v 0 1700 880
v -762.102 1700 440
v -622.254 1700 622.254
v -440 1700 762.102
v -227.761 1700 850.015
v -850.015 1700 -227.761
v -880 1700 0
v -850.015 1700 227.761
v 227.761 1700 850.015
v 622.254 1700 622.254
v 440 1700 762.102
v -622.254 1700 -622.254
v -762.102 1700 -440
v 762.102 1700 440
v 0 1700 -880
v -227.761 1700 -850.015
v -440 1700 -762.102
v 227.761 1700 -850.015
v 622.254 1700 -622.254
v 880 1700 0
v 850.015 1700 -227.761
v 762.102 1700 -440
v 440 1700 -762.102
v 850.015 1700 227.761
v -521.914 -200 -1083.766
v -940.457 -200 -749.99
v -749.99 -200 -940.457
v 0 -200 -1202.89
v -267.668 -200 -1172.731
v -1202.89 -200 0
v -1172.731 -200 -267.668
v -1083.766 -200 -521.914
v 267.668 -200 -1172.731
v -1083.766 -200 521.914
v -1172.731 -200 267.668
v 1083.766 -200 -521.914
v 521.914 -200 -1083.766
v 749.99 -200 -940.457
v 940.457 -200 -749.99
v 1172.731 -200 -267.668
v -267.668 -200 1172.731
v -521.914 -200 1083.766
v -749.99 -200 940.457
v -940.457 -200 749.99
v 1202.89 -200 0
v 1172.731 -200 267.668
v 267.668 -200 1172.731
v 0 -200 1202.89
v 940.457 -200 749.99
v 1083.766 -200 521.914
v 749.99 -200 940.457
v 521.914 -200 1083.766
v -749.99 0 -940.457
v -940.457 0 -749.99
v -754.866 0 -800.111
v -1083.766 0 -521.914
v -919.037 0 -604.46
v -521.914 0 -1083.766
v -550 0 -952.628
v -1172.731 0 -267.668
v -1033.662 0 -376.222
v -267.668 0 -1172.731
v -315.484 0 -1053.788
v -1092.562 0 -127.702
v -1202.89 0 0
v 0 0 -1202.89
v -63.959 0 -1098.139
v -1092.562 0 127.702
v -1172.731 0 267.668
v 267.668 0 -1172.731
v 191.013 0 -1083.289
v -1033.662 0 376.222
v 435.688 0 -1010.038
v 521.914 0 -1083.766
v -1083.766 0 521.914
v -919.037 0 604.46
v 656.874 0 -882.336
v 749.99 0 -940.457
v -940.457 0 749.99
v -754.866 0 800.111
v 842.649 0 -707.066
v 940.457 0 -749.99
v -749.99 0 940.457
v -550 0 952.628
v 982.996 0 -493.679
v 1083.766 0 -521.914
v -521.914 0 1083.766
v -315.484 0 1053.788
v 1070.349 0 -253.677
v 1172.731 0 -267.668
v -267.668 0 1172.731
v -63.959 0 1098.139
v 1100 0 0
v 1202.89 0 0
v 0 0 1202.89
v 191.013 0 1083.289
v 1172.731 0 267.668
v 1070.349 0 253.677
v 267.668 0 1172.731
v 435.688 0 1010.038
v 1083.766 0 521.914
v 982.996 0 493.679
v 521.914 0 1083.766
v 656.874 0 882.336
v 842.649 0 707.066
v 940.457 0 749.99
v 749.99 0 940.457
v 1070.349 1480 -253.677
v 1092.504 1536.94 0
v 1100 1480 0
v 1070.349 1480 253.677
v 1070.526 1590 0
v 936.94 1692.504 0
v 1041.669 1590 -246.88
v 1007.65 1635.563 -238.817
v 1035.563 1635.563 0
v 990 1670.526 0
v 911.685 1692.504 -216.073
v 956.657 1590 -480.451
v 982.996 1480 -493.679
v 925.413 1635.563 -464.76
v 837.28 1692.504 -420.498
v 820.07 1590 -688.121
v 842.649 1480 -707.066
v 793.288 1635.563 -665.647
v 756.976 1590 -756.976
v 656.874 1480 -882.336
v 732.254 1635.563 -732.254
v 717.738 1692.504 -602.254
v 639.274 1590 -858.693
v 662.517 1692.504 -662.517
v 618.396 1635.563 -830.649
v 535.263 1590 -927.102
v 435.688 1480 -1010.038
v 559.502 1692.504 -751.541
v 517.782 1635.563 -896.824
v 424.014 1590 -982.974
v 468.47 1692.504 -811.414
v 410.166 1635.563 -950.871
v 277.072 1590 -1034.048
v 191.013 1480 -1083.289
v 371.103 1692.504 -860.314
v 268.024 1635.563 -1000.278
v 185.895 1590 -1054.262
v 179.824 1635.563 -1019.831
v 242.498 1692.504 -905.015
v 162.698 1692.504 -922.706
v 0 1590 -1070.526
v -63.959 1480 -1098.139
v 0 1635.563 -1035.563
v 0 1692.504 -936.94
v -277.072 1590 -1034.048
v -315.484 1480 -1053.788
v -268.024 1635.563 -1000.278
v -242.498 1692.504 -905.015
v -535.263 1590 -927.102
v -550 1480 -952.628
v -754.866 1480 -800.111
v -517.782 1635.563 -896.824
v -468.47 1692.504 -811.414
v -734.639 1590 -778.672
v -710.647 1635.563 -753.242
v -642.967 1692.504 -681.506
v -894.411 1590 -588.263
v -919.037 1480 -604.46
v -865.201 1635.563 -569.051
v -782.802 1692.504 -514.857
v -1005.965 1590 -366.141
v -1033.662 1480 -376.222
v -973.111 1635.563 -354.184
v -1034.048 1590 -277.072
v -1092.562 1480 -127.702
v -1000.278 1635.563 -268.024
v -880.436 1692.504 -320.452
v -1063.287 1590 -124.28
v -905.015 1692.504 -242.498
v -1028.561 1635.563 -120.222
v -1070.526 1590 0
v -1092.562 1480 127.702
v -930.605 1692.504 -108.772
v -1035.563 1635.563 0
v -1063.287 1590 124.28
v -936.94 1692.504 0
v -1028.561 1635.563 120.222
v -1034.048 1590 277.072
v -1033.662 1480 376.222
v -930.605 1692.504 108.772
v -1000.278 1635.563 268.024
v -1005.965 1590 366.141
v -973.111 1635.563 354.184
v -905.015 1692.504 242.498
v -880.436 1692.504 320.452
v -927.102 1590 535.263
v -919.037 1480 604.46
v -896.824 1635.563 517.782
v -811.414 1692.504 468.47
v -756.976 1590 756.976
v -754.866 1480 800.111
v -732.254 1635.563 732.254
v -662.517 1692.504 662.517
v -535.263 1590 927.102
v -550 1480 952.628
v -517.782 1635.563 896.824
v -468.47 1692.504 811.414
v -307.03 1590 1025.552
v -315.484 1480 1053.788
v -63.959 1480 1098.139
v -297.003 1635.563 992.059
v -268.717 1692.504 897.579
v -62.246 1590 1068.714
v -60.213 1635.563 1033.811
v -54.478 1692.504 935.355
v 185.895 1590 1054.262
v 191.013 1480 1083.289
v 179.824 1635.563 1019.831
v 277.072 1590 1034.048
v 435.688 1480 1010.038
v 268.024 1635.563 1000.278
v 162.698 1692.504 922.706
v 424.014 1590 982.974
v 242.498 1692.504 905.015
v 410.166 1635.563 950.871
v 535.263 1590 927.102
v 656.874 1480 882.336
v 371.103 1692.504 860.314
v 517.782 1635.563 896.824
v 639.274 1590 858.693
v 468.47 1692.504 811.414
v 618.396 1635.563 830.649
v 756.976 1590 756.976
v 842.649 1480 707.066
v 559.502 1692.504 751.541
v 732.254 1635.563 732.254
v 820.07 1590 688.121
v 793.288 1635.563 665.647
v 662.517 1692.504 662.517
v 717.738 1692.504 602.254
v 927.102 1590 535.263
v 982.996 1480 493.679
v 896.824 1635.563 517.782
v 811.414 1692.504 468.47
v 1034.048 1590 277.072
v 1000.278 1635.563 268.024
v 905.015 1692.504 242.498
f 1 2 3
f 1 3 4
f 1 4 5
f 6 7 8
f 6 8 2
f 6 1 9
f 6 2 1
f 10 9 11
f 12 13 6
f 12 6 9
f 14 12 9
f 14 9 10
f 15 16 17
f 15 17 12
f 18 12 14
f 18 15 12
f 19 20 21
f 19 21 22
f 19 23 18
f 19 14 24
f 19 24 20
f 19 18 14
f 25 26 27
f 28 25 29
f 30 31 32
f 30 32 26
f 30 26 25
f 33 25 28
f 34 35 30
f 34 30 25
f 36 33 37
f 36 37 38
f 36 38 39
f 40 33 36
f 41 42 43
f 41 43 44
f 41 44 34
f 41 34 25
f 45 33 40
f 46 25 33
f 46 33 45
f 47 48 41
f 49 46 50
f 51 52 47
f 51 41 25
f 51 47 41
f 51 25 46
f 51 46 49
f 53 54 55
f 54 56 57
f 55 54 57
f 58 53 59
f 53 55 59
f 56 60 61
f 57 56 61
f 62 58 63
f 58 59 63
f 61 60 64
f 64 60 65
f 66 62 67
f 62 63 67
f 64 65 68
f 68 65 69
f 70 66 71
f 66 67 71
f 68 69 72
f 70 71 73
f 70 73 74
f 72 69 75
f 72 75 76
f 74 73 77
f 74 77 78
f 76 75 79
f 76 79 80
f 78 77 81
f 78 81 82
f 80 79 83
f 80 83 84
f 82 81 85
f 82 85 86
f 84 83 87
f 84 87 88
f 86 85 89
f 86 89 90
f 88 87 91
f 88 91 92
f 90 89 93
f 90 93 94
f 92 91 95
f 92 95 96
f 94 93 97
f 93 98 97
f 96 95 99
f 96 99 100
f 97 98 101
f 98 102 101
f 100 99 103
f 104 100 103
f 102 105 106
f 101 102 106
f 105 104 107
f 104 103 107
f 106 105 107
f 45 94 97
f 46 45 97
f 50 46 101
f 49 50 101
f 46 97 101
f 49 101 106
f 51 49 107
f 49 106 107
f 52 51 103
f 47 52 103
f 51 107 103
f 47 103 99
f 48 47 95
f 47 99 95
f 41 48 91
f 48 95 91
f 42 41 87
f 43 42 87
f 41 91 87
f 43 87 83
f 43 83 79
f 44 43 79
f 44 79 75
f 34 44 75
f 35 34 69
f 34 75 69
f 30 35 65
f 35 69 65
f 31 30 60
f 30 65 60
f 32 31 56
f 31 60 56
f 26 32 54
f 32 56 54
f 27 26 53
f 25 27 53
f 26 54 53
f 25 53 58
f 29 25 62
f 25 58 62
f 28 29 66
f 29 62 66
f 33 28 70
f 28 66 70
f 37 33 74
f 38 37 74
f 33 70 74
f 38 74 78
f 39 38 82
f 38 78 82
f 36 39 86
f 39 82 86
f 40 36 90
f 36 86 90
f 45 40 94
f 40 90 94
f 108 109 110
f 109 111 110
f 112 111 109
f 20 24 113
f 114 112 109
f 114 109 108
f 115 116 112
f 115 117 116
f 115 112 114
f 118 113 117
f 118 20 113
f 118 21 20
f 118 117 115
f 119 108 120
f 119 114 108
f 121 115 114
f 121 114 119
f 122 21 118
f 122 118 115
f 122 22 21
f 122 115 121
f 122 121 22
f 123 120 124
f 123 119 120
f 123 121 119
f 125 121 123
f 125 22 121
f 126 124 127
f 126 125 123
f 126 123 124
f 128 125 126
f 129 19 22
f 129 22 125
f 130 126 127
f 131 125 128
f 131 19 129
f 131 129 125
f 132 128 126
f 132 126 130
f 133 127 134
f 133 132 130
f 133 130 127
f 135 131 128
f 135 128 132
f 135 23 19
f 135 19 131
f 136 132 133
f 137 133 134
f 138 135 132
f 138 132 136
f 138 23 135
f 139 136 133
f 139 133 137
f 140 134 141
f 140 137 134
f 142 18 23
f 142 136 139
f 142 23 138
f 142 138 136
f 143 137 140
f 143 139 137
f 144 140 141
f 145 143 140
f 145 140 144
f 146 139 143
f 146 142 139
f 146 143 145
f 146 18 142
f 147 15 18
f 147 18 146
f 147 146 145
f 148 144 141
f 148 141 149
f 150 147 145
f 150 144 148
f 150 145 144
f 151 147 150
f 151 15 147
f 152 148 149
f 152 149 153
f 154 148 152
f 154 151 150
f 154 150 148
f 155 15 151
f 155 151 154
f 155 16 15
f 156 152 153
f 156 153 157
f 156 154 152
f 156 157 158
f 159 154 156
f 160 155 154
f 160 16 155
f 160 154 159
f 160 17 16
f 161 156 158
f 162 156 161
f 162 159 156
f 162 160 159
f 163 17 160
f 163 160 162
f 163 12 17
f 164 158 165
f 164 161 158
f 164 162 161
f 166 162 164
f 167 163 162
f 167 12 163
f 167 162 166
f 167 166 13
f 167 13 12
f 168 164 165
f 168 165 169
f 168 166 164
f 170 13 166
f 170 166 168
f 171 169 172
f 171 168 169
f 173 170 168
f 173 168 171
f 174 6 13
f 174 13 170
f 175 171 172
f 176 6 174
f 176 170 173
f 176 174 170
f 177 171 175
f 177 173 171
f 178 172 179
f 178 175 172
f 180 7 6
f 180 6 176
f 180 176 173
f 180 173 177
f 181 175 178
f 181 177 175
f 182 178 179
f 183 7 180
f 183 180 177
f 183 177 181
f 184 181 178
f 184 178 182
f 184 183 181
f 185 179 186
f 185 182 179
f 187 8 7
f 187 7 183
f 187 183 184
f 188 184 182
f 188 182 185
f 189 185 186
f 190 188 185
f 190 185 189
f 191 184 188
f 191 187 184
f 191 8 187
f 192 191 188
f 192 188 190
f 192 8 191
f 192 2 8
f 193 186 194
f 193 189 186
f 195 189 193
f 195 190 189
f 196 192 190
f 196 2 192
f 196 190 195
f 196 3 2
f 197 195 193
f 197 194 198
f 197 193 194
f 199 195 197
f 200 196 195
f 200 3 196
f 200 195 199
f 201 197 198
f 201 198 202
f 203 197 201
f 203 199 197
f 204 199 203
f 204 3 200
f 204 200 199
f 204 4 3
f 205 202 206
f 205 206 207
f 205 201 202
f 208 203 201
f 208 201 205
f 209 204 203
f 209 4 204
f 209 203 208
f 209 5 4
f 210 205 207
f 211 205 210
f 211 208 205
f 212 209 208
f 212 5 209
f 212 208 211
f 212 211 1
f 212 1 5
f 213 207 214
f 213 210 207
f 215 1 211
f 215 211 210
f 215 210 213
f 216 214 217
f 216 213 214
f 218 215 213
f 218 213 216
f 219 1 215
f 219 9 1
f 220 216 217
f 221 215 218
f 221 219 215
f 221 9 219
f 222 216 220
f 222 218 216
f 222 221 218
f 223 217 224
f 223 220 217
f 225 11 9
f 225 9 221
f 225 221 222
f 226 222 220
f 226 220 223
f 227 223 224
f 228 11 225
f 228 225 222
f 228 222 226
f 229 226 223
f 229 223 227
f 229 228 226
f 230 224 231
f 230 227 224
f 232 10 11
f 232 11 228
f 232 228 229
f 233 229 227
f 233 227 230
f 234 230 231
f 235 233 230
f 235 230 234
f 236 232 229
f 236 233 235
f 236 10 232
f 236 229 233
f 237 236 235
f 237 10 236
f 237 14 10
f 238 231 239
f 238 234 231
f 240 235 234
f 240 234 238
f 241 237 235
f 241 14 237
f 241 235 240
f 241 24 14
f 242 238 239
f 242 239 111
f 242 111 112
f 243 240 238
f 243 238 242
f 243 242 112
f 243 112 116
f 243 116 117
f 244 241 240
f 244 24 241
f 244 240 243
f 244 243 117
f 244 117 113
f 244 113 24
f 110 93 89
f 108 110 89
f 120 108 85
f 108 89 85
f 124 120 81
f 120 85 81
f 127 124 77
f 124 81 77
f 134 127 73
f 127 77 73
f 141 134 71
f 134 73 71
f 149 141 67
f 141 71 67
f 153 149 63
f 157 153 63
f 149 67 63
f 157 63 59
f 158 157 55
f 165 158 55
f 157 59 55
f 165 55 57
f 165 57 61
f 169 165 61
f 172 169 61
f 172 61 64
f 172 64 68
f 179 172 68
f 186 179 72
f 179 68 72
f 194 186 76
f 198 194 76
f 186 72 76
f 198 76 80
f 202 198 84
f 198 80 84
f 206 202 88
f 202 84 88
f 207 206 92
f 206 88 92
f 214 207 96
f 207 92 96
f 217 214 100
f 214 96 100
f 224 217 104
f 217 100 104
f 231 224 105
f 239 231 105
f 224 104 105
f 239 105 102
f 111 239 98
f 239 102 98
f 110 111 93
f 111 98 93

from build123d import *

# Parameters (mm, degrees)
SKETCH2_R           = 1100
BOSS_EXTRUDE1_DEPTH = 1700
FILLET1_R           = 220
SKETCH3_R           = 1202.889766508
BOSS_EXTRUDE2_DEPTH = 200


with BuildPart() as part:
    # Sketch2 → Boss-Extrude1 (new body)
    with BuildSketch(Plane(origin=(0, 0, 0), x_dir=(1, 0, 0), z_dir=(0, 1, 0))):
        Circle(SKETCH2_R)
    extrude(amount=BOSS_EXTRUDE1_DEPTH)

    # Fillet1
    fillet1_edges = [part.edges().sort_by_distance(p)[0] for p in [
        (-1100, 1700, 0),
    ]]
    fillet(fillet1_edges, radius=FILLET1_R)

    # Sketch3 → Boss-Extrude2 (add)
    with BuildSketch(Plane.XZ):
        Circle(SKETCH3_R)
    extrude(amount=BOSS_EXTRUDE2_DEPTH)


solid = part.part
